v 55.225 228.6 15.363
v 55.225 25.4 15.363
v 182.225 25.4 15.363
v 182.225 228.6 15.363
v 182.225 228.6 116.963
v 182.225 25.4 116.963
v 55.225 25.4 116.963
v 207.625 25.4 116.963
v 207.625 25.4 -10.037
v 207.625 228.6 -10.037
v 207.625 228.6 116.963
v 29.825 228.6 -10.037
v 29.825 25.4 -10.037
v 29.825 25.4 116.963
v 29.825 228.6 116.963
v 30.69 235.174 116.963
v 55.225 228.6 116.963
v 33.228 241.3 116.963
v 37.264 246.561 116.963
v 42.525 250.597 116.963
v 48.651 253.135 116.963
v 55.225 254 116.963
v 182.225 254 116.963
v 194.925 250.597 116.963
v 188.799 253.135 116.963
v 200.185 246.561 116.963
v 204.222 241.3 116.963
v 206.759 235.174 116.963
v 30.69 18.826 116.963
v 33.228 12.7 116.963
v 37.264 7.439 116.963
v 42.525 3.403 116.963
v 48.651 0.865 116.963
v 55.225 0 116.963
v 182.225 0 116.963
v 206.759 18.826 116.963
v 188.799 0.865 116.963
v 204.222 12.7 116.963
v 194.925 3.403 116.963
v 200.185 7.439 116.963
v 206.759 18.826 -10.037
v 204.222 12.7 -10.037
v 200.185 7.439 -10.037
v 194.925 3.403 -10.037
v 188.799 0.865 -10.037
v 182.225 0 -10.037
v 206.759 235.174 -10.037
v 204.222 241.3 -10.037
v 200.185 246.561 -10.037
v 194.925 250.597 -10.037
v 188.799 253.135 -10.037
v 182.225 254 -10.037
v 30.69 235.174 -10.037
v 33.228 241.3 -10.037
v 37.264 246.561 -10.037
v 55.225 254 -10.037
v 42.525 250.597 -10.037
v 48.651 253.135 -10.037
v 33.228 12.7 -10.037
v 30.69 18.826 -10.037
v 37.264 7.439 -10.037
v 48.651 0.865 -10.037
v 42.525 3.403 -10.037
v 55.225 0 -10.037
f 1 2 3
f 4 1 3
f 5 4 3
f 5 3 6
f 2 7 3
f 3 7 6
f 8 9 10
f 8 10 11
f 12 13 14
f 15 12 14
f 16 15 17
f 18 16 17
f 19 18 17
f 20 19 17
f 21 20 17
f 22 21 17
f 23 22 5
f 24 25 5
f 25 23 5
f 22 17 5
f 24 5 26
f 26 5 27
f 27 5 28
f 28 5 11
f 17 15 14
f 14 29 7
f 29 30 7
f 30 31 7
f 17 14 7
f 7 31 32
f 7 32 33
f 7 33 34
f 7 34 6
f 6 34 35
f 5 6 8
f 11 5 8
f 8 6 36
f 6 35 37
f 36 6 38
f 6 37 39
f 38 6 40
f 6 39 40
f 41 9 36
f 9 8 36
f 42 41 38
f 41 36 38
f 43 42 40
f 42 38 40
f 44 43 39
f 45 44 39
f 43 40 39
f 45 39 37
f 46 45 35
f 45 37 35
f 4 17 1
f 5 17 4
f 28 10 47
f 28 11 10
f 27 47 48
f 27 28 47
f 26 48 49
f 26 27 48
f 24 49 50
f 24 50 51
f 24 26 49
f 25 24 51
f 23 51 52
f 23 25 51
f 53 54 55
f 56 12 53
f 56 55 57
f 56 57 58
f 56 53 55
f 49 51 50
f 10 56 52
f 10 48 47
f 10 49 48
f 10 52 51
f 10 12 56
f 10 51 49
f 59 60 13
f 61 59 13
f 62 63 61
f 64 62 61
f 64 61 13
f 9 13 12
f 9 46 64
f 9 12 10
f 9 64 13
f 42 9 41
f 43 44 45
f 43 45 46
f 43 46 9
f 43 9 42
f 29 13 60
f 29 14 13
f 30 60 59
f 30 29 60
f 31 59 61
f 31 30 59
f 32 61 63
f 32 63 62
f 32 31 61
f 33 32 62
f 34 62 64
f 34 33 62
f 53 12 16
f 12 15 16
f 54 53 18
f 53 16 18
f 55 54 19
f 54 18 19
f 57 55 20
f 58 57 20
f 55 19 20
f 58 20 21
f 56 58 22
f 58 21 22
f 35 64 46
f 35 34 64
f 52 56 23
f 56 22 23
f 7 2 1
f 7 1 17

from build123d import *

# Parameters (mm, degrees)
F0_W     = 177.8
F0_H     = 127
F1_DEPTH = 254
F2_R     = 25.4
F3_T     = 25.4


# Not quite as in the source:
# - a shell that OpenCascade refuses in one call is made with other operations: the cavity is built on its own and cut out


with BuildPart() as f1:
    # F0 (on Front) → F1 (new body)
    with BuildSketch(Plane.XZ):
        with Locations((118.7249161303, 53.4633891671)):
            Rectangle(F0_W, F0_H)
    extrude(amount=-F1_DEPTH)

    # F2
    f2_edges = [f1.edges().sort_by_distance(p)[0] for p in [
        (207.624916, 0, 53.463389),
        (207.624916, 254, 53.463389),
        (29.824916, 254, 53.463389),
        (29.824916, 0, 53.463389),
    ]]
    fillet(f2_edges, radius=F2_R)

    # F3: shell of thickness 25.4, made by hand


with BuildPart() as f3_core1:
    # F3_t2: copy of F1
    add(f1.part)

    # the walls: a layer under each face that stays
    f3_faces = [f3_core1.faces().sort_by_distance(p)[0] for p in [
        (207.6249161303, 127, 53.4633891671),
        (118.7249161303, 0, 53.4633891671),
        (118.7249161303, 254, 53.4633891671),
        (29.8249161303, 127, 53.4633891671),
        (118.7249161303, 127, -10.0366108329),
    ]]
    thicken(f3_faces, amount=-F3_T, mode=Mode.SUBTRACT)


with BuildPart() as f1_1:
    add(f1.part)

    # what is left inside the walls is the cavity
    f3_cavity = [f3_core1.part.solids().sort_by_distance(p)[0] for p in [
        (118.724916, 160.866667, 15.617389),
    ]]
    add(f3_cavity, mode=Mode.SUBTRACT)


solid = f1_1.part
